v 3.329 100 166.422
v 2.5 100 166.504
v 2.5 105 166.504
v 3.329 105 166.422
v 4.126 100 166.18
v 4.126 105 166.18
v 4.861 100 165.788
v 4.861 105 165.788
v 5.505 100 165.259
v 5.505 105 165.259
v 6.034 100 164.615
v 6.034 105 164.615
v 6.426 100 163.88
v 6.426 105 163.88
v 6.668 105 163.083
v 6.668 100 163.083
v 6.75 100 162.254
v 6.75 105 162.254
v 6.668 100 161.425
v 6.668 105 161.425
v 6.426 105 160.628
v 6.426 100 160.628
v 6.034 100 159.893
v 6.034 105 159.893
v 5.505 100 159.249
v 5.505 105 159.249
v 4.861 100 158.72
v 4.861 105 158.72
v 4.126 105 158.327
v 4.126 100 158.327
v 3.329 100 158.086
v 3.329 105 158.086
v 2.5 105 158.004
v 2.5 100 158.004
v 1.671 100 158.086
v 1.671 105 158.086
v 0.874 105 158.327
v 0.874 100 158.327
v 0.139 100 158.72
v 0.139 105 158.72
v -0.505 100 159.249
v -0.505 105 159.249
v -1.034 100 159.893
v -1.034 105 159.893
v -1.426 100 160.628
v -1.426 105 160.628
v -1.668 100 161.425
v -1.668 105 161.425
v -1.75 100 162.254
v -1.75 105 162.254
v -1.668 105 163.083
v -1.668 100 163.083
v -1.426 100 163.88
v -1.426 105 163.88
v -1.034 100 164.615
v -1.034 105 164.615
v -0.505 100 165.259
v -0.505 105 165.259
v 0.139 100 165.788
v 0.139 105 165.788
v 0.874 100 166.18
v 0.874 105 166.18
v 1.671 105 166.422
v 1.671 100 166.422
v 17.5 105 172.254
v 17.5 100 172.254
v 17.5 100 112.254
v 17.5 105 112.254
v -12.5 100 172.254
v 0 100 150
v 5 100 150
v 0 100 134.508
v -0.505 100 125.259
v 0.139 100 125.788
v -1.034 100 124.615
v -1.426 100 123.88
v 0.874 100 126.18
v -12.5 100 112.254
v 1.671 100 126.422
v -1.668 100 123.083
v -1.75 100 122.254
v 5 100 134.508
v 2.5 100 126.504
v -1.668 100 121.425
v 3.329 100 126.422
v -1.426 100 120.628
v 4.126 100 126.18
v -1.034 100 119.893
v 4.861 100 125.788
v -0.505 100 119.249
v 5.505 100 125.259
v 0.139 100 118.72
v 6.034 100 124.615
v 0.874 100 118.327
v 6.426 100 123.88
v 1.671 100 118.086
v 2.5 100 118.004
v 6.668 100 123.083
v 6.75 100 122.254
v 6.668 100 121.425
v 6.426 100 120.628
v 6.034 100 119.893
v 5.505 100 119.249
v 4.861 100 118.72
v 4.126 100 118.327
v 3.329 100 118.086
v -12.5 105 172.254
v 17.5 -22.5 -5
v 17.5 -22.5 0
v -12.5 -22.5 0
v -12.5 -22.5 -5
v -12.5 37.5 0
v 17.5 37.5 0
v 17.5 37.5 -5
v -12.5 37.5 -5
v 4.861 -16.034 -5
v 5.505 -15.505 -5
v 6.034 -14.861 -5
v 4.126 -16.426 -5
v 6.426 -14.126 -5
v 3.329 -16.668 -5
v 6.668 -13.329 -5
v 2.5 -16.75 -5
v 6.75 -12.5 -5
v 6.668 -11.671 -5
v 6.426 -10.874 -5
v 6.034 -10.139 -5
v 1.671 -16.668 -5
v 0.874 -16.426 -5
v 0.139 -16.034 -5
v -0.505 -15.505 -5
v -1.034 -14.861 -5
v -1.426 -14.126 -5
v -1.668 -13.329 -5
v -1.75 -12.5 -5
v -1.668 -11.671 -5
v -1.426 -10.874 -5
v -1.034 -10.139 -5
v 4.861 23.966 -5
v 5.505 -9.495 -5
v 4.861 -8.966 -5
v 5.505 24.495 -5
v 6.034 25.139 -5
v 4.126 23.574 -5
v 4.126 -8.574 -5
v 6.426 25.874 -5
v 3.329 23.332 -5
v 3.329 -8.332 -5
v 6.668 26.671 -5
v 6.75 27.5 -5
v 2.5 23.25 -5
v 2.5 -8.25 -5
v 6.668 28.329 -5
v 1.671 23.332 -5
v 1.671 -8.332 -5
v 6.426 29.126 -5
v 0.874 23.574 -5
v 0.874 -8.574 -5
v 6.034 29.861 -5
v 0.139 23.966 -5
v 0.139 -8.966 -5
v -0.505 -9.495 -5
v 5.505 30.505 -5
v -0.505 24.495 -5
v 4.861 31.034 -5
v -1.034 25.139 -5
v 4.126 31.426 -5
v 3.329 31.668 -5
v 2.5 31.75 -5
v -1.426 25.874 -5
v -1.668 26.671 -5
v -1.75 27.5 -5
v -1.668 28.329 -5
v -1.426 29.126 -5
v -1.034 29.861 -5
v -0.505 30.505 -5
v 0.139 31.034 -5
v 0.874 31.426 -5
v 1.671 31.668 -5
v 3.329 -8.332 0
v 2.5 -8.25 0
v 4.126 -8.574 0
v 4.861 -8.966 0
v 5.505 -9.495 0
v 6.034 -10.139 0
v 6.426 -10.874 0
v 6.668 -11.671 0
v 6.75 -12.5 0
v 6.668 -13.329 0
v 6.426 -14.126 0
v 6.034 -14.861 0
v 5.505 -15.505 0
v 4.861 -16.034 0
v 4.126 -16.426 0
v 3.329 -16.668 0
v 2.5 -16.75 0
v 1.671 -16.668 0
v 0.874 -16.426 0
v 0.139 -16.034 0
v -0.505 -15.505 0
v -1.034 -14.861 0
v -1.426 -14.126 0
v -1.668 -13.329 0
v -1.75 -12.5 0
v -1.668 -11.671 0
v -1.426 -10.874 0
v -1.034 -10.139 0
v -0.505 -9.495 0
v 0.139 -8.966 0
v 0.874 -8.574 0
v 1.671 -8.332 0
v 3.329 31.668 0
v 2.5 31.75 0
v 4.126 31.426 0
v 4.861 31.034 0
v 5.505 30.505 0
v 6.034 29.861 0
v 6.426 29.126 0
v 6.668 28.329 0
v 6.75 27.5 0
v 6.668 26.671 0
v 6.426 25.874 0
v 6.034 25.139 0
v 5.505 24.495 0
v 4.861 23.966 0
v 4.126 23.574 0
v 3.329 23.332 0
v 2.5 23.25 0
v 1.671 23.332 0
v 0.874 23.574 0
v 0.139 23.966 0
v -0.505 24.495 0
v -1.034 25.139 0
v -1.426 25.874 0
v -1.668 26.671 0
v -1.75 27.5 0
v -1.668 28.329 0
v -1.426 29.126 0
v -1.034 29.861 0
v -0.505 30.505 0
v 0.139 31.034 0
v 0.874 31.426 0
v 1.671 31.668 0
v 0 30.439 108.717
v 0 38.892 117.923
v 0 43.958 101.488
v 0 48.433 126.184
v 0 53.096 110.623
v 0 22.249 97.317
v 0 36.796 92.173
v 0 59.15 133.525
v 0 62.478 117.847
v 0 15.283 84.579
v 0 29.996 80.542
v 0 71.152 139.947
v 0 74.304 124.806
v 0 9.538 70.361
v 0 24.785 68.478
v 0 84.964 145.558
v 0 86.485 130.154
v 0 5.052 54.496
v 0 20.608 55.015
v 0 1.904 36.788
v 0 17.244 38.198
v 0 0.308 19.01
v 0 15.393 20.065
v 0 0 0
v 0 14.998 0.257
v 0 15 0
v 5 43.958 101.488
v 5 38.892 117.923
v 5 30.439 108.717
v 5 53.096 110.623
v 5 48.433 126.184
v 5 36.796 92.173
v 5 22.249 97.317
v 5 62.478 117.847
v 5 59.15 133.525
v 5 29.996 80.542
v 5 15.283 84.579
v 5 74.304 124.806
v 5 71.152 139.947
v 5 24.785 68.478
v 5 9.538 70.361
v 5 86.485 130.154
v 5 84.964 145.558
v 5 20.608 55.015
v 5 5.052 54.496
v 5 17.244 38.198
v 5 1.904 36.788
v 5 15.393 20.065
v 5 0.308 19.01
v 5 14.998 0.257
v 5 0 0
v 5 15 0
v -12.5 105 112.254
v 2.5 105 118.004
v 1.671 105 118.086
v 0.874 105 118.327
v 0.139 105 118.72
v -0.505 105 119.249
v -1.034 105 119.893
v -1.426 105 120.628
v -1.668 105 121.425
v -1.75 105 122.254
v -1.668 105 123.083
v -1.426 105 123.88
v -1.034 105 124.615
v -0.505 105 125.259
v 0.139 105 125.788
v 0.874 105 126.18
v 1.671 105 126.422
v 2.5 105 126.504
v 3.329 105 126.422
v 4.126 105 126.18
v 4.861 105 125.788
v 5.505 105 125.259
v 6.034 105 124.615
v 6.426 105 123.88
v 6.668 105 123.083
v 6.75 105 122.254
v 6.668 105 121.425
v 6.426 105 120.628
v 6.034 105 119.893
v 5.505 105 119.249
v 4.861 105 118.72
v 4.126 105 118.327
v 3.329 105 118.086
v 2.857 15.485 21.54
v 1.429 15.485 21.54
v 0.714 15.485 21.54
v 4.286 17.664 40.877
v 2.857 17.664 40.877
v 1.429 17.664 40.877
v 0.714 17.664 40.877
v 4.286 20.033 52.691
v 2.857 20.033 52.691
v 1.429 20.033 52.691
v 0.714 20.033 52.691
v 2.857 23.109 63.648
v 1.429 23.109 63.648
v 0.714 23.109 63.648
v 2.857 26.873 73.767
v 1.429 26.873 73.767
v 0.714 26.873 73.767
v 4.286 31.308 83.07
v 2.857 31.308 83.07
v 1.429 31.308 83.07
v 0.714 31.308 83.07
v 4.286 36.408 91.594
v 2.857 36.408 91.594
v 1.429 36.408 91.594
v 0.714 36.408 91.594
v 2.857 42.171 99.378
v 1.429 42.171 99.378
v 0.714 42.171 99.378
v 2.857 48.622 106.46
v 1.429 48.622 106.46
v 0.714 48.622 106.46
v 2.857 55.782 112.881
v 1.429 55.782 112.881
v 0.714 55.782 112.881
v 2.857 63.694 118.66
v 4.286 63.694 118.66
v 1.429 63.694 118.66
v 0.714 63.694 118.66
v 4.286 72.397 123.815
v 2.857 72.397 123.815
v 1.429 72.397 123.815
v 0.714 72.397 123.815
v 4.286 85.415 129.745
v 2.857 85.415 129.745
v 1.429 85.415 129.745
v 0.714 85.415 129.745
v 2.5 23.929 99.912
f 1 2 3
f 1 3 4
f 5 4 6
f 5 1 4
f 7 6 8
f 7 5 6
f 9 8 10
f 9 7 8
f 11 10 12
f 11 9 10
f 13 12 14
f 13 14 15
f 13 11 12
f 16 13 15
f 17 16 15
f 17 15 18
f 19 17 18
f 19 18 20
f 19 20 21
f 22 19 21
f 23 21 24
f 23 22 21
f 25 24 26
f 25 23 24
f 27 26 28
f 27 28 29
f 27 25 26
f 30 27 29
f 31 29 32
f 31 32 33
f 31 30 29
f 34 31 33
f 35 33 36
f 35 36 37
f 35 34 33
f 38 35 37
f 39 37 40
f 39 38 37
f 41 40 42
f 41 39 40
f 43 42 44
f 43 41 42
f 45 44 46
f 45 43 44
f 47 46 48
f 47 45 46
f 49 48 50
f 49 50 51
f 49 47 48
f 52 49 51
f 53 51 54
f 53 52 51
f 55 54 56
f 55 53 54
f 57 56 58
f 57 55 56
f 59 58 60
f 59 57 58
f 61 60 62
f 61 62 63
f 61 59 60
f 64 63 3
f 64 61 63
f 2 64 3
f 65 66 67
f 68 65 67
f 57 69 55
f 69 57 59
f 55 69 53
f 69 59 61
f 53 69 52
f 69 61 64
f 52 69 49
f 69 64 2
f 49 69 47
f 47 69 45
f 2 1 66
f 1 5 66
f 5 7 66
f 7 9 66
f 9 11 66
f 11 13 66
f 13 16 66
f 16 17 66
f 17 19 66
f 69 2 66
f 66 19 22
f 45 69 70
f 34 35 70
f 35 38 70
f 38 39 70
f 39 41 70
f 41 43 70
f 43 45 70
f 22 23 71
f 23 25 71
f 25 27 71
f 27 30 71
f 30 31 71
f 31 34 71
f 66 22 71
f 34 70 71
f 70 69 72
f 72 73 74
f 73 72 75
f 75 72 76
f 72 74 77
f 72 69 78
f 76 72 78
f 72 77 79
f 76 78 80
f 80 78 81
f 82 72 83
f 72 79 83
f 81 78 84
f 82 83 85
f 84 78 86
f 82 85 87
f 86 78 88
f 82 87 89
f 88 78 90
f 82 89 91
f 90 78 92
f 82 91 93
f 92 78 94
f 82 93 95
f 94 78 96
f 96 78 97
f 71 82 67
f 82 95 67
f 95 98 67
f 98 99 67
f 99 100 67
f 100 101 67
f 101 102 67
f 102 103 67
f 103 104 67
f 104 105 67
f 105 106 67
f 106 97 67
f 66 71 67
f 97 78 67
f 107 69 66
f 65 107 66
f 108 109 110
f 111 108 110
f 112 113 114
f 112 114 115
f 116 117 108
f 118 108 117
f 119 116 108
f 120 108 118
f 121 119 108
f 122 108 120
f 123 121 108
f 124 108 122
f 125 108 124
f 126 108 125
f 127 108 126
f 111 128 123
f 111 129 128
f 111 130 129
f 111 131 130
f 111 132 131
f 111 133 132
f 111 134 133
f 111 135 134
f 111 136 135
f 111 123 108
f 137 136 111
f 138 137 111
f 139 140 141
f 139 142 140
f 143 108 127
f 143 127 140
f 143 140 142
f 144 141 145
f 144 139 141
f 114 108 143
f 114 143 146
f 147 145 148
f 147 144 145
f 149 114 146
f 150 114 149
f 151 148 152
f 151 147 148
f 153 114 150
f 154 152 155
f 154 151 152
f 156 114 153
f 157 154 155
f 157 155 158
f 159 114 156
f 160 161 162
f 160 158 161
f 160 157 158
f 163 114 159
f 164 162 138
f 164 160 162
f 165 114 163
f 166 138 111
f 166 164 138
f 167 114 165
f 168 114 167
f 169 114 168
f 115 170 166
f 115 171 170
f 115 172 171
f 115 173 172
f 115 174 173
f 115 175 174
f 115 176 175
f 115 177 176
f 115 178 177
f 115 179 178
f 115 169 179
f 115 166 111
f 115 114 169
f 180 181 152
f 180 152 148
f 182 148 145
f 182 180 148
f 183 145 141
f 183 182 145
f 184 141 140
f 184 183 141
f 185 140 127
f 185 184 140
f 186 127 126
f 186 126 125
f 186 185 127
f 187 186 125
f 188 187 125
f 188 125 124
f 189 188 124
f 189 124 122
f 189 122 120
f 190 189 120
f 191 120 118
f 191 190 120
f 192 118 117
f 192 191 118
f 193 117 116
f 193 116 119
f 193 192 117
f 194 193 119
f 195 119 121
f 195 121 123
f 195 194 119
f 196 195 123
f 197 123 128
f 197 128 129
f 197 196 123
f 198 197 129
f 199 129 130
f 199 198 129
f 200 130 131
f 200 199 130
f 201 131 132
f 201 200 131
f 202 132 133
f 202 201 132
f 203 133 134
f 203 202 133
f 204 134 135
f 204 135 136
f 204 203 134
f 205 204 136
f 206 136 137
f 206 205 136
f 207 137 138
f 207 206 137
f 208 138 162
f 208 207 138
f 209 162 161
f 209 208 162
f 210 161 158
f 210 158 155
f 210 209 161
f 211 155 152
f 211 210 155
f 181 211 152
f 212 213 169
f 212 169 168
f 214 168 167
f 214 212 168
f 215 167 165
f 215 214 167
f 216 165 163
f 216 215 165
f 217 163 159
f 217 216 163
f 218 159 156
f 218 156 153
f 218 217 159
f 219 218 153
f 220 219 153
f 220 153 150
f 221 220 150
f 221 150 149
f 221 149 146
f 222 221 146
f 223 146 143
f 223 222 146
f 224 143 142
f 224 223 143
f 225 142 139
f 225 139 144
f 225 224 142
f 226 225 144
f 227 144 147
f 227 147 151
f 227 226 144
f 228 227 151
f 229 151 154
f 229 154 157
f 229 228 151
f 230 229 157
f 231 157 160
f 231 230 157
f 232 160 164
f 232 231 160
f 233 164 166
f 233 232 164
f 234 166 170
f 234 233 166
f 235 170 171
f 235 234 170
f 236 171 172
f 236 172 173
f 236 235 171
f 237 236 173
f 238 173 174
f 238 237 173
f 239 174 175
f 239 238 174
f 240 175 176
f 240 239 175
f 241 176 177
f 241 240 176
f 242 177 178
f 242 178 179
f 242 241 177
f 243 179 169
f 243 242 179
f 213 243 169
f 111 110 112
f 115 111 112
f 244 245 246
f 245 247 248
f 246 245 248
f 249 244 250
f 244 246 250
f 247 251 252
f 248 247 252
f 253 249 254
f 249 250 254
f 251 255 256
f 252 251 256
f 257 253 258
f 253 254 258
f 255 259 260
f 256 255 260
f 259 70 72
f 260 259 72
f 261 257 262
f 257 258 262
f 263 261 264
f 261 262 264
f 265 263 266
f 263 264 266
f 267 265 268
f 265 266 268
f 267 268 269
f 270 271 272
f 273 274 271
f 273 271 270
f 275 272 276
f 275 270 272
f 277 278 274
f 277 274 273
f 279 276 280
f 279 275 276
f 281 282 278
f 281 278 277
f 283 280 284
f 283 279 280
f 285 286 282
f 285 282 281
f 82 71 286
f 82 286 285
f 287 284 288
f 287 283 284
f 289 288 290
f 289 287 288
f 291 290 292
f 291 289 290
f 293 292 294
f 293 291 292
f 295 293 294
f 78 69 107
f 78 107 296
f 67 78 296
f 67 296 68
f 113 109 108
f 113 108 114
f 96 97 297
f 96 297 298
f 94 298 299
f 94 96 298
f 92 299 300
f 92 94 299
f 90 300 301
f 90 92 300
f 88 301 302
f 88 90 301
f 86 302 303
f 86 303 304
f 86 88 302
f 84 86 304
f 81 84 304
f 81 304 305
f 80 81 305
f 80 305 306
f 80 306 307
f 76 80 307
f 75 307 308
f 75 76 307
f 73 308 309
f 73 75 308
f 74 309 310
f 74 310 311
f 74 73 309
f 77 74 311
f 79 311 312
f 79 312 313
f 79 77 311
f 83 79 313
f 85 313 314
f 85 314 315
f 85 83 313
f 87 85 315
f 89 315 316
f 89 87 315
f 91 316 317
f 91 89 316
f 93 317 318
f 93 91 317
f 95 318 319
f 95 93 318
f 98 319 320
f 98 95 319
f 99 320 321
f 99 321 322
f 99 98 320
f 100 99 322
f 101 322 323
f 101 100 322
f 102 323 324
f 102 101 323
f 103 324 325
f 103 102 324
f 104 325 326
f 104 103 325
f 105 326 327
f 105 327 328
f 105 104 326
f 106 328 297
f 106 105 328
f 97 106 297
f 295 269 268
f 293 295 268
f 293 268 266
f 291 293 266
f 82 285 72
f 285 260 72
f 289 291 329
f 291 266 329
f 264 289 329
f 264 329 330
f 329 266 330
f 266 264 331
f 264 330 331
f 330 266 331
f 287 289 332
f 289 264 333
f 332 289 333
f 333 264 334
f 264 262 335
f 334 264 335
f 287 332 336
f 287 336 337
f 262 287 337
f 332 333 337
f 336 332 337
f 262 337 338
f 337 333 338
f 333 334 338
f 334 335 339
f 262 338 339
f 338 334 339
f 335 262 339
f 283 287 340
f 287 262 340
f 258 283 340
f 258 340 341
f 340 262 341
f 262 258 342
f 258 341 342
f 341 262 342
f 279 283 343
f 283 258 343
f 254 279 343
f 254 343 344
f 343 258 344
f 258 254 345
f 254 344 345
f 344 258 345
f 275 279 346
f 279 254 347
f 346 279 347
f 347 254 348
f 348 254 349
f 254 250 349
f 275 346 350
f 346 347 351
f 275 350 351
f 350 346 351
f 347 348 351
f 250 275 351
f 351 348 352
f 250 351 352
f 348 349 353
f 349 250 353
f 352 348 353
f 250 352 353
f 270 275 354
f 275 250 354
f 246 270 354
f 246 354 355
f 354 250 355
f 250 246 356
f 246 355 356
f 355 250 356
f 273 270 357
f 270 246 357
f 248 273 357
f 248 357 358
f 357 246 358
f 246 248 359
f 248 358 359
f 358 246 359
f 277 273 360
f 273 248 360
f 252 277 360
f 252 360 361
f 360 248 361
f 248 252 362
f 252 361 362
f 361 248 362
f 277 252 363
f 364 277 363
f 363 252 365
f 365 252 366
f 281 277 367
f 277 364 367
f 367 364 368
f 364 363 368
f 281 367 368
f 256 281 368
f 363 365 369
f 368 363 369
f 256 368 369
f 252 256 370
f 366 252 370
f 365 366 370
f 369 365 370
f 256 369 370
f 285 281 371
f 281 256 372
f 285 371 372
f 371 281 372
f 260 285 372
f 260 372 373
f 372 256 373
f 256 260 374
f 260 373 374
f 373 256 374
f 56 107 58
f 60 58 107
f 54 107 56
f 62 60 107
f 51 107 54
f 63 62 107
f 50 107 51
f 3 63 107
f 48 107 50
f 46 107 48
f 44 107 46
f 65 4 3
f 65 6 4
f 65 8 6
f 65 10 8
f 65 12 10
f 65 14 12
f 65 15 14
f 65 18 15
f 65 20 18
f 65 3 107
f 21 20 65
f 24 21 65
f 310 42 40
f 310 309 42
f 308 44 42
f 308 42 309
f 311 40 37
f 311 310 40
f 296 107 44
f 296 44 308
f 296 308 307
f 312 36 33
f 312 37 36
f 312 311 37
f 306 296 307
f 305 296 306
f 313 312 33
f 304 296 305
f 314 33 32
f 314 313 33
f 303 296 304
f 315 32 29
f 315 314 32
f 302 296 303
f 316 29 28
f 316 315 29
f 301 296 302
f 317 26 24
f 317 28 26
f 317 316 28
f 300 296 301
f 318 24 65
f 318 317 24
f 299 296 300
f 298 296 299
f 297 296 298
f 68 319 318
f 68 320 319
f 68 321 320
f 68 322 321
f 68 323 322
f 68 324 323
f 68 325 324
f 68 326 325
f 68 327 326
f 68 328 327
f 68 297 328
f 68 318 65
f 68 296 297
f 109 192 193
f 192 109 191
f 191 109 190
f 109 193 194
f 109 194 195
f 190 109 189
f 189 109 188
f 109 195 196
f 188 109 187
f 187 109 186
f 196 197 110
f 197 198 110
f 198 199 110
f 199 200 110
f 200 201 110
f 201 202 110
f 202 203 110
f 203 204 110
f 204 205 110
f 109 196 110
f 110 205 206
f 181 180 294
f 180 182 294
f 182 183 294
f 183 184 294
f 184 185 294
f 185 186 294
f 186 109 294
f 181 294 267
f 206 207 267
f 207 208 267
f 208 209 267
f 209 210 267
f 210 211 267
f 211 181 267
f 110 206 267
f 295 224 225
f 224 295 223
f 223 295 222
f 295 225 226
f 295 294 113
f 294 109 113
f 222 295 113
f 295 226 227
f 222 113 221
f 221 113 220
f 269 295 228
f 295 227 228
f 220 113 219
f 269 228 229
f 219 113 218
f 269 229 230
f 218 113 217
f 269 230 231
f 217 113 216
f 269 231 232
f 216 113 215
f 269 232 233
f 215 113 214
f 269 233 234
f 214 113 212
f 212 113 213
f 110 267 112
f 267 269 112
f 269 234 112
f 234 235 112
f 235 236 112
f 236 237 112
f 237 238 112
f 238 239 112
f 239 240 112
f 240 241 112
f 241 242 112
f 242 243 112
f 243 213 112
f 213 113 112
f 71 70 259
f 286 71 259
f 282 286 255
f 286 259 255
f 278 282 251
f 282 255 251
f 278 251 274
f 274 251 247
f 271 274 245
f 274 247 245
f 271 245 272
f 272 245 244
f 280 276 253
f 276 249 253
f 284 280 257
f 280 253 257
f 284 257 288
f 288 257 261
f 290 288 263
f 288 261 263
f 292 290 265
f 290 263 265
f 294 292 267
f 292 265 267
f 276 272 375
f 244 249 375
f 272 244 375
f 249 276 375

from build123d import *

# Parameters (mm, degrees)
BOSS_EXTRUDE3_DEPTH = 5
SKETCH5_W           = 30
SKETCH5_H           = 60
SKETCH5_R           = 4.25
BOSS_EXTRUDE7_DEPTH = 5
SKETCH6_W           = 30
SKETCH6_H           = 60
SKETCH6_R           = 4.25
BOSS_EXTRUDE8_DEPTH = 5


# Read off the part's stored shape, not the designer's step: Boss-Extrude3
with BuildPart() as part:
    # Boss-Extrude3 outline → Boss-Extrude3 (new body)
    with BuildSketch(Plane(origin=(0, 0, 0), x_dir=(0, 0, -1), z_dir=(1, 0, 0))):
        with BuildLine():
            Line((-134.507952774, 100), (-150, 100))
            add(Edge.make_bspline(
                [(-150, 100), (-124.823277558, -2.14164181), (0, 0)],
                knots=[0, 0, 0, 1, 1, 1], degree=2))
            Line((0, 0), (0, 15))
            Line((0, 15), (-0.257322997, 14.997792667))
            add(Edge.make_bspline(
                [(-0.257322997, 14.997792667), (-22.513069097, 14.639377531), (-53.120235991, 19.679743273), (-74.17523554, 26.538598941), (-91.96421888, 36.076540514), (-106.790873123, 48.266354422), (-118.971580699, 63.298366178), (-130.328132656, 84.632434891), (-134.507952774, 100)],
                knots=[0, 0, 0, 0.1875, 0.3125, 0.4375, 0.5625, 0.6875, 0.8125, 0.98060163, 0.98060163, 0.98060163], degree=2))
        make_face()
    extrude(amount=BOSS_EXTRUDE3_DEPTH)

    # Sketch5 → Boss-Extrude7 (add)
    with BuildSketch(Plane(origin=(0, 100, 0), x_dir=(1, 0, 0), z_dir=(0, 1, 0))):
        with Locations((2.5, -142.253976387)):
            Rectangle(SKETCH5_W, SKETCH5_H)
        with Locations(Location((2.5, -162.253976387, 0), (0, 0, 270))):
            Circle(SKETCH5_R, mode=Mode.SUBTRACT)
        with Locations(Location((2.5, -122.253976387, 0), (0, 0, 90))):
            Circle(SKETCH5_R, mode=Mode.SUBTRACT)
    extrude(amount=BOSS_EXTRUDE7_DEPTH)

    # Sketch6 → Boss-Extrude8 (add)
    with BuildSketch(Plane(origin=(0, 0, 0), x_dir=(-1, 0, 0), z_dir=(0, 0, -1))):
        with Locations((-2.5, 7.5)):
            Rectangle(SKETCH6_W, SKETCH6_H)
        with Locations(Location((-2.5, 27.5, 0), (0, 0, 90))):
            Circle(SKETCH6_R, mode=Mode.SUBTRACT)
        with Locations(Location((-2.5, -12.5, 0), (0, 0, 90))):
            Circle(SKETCH6_R, mode=Mode.SUBTRACT)
    extrude(amount=BOSS_EXTRUDE8_DEPTH)


solid = part.part
